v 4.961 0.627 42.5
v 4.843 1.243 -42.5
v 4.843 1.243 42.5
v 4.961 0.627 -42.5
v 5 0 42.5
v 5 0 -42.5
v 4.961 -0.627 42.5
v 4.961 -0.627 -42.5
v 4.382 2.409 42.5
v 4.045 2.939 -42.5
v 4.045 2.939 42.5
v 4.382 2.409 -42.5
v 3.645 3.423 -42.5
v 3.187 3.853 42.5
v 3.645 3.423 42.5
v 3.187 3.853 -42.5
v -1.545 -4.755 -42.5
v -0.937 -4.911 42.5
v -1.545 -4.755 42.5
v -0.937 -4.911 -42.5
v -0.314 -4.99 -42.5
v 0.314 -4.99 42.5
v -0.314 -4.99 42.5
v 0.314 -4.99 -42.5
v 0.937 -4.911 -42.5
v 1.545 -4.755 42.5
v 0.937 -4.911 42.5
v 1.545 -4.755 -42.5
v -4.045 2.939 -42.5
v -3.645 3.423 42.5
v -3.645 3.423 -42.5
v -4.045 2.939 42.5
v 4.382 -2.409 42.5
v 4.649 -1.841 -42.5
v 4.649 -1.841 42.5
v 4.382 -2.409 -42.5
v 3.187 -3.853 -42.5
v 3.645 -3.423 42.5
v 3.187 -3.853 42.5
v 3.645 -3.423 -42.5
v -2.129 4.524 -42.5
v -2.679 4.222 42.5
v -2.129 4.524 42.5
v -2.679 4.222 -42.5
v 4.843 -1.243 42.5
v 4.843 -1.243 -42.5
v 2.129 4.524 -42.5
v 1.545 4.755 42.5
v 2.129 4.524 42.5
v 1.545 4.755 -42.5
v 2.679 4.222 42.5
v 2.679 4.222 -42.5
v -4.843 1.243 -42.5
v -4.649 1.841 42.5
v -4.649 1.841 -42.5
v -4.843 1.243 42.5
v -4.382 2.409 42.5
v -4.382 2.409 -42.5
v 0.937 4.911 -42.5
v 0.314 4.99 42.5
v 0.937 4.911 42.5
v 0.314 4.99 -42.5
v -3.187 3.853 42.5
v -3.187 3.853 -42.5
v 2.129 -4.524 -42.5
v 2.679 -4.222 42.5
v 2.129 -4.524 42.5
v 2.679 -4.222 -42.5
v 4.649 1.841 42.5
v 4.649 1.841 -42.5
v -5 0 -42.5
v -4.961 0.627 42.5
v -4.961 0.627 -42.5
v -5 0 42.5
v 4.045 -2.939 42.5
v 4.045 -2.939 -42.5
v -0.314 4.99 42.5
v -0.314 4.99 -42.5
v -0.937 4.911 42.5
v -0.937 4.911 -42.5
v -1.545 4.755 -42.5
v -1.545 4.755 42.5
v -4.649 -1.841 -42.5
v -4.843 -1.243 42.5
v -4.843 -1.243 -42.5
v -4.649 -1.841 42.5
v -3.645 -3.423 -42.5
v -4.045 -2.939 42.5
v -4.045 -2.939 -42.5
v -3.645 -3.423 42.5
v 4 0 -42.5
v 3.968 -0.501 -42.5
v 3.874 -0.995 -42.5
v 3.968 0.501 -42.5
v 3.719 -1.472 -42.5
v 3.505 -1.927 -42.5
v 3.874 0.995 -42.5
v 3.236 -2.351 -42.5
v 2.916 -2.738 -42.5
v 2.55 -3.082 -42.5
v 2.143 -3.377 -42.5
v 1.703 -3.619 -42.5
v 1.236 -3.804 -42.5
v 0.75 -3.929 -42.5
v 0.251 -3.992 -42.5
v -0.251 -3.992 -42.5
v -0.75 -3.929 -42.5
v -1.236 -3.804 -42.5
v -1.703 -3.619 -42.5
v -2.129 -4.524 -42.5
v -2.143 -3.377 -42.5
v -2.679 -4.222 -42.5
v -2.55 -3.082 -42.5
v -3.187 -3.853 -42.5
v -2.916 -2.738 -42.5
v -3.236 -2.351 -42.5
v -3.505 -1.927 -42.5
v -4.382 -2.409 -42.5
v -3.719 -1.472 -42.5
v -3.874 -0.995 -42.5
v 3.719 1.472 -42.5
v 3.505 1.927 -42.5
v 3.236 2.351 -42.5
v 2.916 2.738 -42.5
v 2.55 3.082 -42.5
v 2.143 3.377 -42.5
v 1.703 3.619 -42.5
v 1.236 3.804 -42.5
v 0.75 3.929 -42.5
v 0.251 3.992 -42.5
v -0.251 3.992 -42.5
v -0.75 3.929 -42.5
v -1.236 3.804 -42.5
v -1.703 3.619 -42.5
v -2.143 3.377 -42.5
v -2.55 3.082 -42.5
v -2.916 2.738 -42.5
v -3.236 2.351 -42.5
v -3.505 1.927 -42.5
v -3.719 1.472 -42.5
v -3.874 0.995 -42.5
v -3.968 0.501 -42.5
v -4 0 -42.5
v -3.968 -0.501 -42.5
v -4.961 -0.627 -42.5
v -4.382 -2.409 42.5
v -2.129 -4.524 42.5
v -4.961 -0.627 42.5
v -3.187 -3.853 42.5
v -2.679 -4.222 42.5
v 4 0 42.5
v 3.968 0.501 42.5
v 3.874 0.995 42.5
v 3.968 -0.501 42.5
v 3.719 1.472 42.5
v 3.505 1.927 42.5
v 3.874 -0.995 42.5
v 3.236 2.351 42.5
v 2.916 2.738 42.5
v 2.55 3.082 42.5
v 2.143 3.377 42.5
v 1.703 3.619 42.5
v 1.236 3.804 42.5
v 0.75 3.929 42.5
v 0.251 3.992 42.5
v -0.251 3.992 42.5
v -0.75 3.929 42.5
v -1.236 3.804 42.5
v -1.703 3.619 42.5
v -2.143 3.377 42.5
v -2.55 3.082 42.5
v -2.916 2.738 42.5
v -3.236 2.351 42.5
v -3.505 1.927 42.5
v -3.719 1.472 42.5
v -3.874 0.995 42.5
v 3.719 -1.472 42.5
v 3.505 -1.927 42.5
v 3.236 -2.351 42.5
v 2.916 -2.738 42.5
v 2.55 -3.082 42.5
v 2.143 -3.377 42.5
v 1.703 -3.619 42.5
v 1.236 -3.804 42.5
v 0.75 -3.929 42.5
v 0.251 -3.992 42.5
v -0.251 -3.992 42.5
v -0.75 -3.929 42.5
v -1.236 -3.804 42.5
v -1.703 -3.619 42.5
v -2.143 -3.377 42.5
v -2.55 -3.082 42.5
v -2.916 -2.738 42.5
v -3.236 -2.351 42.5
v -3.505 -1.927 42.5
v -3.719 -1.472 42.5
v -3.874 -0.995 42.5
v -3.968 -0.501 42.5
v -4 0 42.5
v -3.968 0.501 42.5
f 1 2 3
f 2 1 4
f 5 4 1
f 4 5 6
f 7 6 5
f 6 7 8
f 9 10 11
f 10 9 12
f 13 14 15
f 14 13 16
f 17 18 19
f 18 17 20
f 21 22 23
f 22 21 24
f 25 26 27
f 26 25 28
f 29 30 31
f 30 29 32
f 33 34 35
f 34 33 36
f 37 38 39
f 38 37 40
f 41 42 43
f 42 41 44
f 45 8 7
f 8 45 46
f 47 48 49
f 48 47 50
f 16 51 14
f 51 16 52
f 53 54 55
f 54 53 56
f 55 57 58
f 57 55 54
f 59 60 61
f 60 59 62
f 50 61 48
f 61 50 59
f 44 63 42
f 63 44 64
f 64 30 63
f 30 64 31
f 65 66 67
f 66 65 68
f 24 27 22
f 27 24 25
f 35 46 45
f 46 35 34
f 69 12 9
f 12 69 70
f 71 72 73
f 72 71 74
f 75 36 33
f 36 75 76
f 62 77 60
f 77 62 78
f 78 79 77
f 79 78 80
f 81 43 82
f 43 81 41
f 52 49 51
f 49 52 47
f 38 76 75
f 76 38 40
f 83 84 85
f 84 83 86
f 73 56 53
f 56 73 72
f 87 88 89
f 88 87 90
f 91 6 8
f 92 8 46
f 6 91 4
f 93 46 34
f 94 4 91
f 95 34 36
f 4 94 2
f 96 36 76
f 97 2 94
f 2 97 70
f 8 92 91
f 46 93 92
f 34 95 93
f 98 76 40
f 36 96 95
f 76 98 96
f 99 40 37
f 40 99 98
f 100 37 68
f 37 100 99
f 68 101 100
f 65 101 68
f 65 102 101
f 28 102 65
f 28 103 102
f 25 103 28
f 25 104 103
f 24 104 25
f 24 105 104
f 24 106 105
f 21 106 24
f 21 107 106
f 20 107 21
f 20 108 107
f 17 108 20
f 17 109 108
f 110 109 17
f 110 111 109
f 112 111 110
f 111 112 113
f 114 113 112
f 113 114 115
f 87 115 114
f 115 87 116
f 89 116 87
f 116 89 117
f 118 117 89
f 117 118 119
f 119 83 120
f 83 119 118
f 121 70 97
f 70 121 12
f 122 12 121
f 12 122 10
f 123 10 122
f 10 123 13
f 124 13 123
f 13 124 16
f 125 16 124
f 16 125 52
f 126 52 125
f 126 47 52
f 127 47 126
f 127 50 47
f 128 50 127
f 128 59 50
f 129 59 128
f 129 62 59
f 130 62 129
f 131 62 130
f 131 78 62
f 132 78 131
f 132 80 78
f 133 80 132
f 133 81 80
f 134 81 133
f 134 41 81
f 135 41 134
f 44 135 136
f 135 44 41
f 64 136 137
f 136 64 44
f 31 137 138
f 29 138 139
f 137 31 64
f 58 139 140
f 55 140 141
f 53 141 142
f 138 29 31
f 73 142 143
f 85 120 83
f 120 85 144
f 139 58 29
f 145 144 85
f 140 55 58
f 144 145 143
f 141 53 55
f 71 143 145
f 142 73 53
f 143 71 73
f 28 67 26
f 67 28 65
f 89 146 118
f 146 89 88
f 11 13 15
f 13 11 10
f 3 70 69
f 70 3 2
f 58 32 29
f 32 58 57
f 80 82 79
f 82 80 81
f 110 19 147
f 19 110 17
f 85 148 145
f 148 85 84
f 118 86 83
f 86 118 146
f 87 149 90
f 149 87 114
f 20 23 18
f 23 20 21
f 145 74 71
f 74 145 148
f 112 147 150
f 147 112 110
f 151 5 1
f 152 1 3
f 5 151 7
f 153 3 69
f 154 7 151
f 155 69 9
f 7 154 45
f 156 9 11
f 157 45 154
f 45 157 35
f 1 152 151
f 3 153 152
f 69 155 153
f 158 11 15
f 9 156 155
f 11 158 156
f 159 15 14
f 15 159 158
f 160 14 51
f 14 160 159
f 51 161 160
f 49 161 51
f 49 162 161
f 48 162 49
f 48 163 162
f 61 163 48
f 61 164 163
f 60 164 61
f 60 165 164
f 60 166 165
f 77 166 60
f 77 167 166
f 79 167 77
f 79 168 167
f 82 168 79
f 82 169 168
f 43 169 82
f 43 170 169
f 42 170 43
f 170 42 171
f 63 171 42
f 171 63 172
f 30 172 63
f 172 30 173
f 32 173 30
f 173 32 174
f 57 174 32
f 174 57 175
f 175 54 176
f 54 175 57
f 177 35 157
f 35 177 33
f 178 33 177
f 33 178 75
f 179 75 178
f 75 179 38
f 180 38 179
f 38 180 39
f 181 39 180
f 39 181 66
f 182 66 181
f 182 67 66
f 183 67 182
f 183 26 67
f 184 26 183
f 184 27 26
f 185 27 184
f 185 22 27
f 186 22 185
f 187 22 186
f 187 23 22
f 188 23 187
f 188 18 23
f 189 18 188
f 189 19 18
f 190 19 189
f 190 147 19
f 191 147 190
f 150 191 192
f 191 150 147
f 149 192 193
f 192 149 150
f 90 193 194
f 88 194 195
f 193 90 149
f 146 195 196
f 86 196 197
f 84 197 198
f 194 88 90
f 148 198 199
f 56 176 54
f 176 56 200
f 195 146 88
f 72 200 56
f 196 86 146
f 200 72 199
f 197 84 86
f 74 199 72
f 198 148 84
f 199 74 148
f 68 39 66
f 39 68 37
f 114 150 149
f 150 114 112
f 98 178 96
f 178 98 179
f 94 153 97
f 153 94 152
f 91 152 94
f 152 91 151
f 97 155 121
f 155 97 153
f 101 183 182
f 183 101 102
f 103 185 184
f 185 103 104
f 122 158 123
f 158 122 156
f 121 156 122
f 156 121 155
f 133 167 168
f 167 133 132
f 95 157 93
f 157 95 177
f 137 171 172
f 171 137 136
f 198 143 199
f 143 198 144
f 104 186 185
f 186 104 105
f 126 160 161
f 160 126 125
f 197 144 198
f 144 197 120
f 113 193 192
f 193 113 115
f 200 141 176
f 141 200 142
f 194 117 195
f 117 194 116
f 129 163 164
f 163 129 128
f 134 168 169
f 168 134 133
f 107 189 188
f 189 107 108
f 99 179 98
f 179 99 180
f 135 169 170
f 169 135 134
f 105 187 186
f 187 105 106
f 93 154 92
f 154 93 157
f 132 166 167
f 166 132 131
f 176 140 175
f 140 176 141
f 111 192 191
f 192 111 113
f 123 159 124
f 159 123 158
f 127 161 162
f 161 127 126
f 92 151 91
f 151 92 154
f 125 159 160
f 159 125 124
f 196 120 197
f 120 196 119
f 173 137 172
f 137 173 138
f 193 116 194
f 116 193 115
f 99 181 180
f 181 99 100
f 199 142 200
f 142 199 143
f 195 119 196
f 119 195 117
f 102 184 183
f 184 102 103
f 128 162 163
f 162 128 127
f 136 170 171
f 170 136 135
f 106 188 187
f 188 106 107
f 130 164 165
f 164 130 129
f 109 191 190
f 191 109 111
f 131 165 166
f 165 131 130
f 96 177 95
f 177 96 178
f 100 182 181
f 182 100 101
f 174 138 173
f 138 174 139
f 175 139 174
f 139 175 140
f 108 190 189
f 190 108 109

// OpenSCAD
$fn = 50;


difference() {
	union() {
		translate(v = [0, 0, -42.5000000000]) {
			cylinder(h = 85, r = 5.0000000000);
		}
	}
	union() {
		translate(v = [0, 0, -100.0000000000]) {
			cylinder(h = 200, r = 4.0000000000);
		}
	}
}
